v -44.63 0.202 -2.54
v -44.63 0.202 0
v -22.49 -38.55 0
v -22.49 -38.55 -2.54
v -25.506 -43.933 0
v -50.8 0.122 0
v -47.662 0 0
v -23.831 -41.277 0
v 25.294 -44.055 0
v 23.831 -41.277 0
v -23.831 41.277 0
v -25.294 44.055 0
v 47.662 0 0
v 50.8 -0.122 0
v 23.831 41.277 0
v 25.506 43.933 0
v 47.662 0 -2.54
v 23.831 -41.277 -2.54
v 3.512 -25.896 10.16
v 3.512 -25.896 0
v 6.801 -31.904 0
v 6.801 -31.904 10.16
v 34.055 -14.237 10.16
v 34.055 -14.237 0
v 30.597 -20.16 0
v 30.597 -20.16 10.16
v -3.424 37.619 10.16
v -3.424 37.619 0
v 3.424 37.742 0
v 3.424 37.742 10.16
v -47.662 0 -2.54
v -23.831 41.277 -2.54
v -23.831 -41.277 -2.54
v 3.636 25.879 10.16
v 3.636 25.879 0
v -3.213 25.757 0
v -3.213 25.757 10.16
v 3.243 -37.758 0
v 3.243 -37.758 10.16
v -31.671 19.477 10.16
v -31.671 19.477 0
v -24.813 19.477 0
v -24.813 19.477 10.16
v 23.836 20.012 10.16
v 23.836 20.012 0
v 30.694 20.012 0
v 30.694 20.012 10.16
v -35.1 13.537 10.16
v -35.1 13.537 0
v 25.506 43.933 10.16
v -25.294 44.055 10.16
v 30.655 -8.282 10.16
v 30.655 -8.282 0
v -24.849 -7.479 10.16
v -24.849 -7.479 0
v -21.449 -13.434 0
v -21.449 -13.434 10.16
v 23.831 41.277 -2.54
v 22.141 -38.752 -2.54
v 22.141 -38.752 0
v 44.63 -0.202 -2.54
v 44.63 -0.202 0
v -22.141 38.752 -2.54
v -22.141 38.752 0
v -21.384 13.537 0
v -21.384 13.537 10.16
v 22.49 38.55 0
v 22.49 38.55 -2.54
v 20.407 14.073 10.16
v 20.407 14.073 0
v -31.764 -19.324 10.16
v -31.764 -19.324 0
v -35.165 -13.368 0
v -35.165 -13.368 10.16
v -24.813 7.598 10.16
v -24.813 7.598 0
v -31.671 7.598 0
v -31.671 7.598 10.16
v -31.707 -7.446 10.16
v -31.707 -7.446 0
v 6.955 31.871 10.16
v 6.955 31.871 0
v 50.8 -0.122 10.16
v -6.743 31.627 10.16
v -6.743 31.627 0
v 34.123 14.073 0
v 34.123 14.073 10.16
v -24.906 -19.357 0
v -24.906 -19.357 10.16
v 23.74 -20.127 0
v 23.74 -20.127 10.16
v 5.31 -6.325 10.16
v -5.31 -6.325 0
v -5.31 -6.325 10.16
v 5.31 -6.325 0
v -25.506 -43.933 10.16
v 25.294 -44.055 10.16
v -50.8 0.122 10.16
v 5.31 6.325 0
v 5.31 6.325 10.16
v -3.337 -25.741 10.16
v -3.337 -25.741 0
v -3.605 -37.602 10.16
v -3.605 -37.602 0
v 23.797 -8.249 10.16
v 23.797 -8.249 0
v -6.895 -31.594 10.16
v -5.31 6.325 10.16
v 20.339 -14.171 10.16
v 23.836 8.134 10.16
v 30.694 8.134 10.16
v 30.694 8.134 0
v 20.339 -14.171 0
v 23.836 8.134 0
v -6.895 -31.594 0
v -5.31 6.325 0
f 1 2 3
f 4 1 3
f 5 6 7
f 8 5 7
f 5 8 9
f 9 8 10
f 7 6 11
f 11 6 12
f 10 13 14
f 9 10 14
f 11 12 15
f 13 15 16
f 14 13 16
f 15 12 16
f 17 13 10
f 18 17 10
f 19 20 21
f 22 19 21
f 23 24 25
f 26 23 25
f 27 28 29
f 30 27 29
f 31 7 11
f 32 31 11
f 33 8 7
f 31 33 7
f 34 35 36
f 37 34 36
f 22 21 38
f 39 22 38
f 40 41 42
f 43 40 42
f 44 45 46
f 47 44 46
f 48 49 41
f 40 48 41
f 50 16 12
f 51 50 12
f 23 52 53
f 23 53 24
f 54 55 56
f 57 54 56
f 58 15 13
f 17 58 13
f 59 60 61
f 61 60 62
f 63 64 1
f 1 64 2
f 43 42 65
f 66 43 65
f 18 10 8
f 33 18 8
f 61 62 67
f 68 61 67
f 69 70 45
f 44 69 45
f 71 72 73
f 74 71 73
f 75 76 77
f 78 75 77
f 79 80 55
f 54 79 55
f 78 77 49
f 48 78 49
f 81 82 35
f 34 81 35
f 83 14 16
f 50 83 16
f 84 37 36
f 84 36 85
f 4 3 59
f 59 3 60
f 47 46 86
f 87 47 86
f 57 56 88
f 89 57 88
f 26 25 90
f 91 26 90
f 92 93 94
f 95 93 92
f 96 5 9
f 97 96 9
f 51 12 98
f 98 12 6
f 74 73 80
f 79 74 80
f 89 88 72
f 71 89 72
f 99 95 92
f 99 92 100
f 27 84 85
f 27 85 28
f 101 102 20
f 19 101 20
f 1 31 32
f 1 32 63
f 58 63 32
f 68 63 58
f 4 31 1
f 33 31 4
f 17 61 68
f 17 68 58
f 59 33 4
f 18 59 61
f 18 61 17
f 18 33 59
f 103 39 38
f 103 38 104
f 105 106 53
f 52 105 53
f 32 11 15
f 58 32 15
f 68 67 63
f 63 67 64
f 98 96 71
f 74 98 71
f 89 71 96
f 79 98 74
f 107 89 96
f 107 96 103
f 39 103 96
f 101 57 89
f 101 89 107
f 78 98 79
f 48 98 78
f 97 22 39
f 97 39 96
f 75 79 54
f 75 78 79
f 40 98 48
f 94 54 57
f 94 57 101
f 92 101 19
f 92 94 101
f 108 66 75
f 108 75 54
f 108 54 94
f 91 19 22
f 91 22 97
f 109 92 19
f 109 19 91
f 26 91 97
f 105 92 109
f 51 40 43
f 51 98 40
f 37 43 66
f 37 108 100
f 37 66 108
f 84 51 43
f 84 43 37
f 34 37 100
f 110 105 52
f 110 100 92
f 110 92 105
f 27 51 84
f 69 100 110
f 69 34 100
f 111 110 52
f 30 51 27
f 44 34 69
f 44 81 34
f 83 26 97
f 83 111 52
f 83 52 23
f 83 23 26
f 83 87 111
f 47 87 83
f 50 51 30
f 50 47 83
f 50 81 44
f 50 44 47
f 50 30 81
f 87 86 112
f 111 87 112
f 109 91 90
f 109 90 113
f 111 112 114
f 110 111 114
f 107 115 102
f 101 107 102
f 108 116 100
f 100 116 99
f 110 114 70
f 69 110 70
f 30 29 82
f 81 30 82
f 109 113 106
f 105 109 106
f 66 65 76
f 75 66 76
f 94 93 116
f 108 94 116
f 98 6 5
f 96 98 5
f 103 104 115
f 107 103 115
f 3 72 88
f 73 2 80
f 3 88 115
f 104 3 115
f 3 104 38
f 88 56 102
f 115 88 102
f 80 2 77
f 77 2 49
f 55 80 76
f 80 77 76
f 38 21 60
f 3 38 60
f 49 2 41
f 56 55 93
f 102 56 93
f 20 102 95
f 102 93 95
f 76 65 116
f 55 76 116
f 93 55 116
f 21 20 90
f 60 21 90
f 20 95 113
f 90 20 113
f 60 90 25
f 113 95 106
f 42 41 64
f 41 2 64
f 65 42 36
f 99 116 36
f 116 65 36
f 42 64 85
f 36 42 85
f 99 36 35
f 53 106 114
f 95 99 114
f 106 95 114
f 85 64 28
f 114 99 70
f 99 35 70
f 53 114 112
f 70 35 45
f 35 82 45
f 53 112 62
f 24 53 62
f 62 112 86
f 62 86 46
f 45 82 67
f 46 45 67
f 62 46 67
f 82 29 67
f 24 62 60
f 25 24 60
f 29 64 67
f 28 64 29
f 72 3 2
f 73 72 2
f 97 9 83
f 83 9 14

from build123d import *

# Parameters (mm, degrees)
F0_W     = 10.62
F0_H     = 12.65
F1_DEPTH = 10.16
F3_DEPTH = 2.54
F4_DEPTH = 2.54
F5_DEPTH = 2.54
F6_DEPTH = 2.54
F7_DEPTH = 2.54
F8_DEPTH = 2.54


with BuildPart() as f1:
    # F0 (on Top) → F1 (new body)
    with BuildSketch(Plane.XY):
        Polygon((50.799853, -0.122195), (25.505751, 43.932866), (-25.294102, 44.055061), (-50.799853, 0.122195), (-25.505751, -43.932866), (25.294102, -44.055061), align=None)
        Polygon((-3.33668, -25.740905), (3.511563, -25.896048), (6.801327, -31.904372), (3.242847, -37.757553), (-3.605395, -37.60241), (-6.895159, -31.594086), align=None, mode=Mode.SUBTRACT)
        Polygon((-24.849274, -7.47878), (-21.448886, -13.43441), (-24.906419, -19.357047), (-31.76434, -19.324054), (-35.164728, -13.368424), (-31.707195, -7.445787), align=None, mode=Mode.SUBTRACT)
        Polygon((23.739571, -20.126873), (20.339183, -14.171243), (23.796716, -8.248606), (30.654636, -8.281598), (34.055024, -14.237228), (30.597491, -20.159865), align=None, mode=Mode.SUBTRACT)
        Polygon((-21.384008, 13.537441), (-24.813008, 7.598239), (-31.671008, 7.598239), (-35.100008, 13.537441), (-31.671008, 19.476643), (-24.813008, 19.476643), align=None, mode=Mode.SUBTRACT)
        Rectangle(F0_W, F0_H, mode=Mode.SUBTRACT)
        Polygon((34.123123, 14.07323), (30.694123, 8.134028), (23.836123, 8.134028), (20.407123, 14.07323), (23.836123, 20.012433), (30.694123, 20.012433), align=None, mode=Mode.SUBTRACT)
        Polygon((-6.743086, 31.626892), (-3.424455, 37.61932), (3.424455, 37.741515), (6.954734, 31.871283), (3.636104, 25.878855), (-3.212806, 25.75666), align=None, mode=Mode.SUBTRACT)
    extrude(amount=F1_DEPTH)

    # F2 (on face) → F3 (join)
    with BuildSketch(Plane(origin=(0, 0, 0), x_dir=(1, 0, 0), z_dir=(0, 0, -1))):
        Polygon((44.630353, 0.201512), (22.489691, -38.550264), (23.831054, -41.276596), (47.662108, 0), align=None)
    extrude(amount=F3_DEPTH)

    # F2 (on face) → F4 (join)
    with BuildSketch(Plane(origin=(0, 0, 0), x_dir=(1, 0, 0), z_dir=(0, 0, -1))):
        Polygon((22.140662, 38.751775), (44.630353, 0.201512), (47.662108, 0), (23.831054, 41.276596), align=None)
    extrude(amount=F4_DEPTH)

    # F2 (on face) → F5 (join)
    with BuildSketch(Plane(origin=(0, 0, 0), x_dir=(1, 0, 0), z_dir=(0, 0, -1))):
        Polygon((-23.831054, 41.276596), (-22.489691, 38.550264), (22.140662, 38.751775), (23.831054, 41.276596), align=None)
    extrude(amount=F5_DEPTH)

    # F2 (on face) → F6 (join)
    with BuildSketch(Plane(origin=(0, 0, 0), x_dir=(1, 0, 0), z_dir=(0, 0, -1))):
        Polygon((-47.662108, 0), (-44.630353, -0.201512), (-22.489691, 38.550264), (-23.831054, 41.276596), align=None)
    extrude(amount=F6_DEPTH)

    # F2 (on face) → F7 (join)
    with BuildSketch(Plane(origin=(0, 0, 0), x_dir=(1, 0, 0), z_dir=(0, 0, -1))):
        Polygon((-23.831054, -41.276596), (-22.140662, -38.751775), (-44.630353, -0.201512), (-47.662108, 0), align=None)
    extrude(amount=F7_DEPTH)

    # F2 (on face) → F8 (join)
    with BuildSketch(Plane(origin=(0, 0, 0), x_dir=(1, 0, 0), z_dir=(0, 0, -1))):
        Polygon((22.489691, -38.550264), (-22.140662, -38.751775), (-23.831054, -41.276596), (23.831054, -41.276596), align=None)
    extrude(amount=F8_DEPTH)


solid = f1.part
